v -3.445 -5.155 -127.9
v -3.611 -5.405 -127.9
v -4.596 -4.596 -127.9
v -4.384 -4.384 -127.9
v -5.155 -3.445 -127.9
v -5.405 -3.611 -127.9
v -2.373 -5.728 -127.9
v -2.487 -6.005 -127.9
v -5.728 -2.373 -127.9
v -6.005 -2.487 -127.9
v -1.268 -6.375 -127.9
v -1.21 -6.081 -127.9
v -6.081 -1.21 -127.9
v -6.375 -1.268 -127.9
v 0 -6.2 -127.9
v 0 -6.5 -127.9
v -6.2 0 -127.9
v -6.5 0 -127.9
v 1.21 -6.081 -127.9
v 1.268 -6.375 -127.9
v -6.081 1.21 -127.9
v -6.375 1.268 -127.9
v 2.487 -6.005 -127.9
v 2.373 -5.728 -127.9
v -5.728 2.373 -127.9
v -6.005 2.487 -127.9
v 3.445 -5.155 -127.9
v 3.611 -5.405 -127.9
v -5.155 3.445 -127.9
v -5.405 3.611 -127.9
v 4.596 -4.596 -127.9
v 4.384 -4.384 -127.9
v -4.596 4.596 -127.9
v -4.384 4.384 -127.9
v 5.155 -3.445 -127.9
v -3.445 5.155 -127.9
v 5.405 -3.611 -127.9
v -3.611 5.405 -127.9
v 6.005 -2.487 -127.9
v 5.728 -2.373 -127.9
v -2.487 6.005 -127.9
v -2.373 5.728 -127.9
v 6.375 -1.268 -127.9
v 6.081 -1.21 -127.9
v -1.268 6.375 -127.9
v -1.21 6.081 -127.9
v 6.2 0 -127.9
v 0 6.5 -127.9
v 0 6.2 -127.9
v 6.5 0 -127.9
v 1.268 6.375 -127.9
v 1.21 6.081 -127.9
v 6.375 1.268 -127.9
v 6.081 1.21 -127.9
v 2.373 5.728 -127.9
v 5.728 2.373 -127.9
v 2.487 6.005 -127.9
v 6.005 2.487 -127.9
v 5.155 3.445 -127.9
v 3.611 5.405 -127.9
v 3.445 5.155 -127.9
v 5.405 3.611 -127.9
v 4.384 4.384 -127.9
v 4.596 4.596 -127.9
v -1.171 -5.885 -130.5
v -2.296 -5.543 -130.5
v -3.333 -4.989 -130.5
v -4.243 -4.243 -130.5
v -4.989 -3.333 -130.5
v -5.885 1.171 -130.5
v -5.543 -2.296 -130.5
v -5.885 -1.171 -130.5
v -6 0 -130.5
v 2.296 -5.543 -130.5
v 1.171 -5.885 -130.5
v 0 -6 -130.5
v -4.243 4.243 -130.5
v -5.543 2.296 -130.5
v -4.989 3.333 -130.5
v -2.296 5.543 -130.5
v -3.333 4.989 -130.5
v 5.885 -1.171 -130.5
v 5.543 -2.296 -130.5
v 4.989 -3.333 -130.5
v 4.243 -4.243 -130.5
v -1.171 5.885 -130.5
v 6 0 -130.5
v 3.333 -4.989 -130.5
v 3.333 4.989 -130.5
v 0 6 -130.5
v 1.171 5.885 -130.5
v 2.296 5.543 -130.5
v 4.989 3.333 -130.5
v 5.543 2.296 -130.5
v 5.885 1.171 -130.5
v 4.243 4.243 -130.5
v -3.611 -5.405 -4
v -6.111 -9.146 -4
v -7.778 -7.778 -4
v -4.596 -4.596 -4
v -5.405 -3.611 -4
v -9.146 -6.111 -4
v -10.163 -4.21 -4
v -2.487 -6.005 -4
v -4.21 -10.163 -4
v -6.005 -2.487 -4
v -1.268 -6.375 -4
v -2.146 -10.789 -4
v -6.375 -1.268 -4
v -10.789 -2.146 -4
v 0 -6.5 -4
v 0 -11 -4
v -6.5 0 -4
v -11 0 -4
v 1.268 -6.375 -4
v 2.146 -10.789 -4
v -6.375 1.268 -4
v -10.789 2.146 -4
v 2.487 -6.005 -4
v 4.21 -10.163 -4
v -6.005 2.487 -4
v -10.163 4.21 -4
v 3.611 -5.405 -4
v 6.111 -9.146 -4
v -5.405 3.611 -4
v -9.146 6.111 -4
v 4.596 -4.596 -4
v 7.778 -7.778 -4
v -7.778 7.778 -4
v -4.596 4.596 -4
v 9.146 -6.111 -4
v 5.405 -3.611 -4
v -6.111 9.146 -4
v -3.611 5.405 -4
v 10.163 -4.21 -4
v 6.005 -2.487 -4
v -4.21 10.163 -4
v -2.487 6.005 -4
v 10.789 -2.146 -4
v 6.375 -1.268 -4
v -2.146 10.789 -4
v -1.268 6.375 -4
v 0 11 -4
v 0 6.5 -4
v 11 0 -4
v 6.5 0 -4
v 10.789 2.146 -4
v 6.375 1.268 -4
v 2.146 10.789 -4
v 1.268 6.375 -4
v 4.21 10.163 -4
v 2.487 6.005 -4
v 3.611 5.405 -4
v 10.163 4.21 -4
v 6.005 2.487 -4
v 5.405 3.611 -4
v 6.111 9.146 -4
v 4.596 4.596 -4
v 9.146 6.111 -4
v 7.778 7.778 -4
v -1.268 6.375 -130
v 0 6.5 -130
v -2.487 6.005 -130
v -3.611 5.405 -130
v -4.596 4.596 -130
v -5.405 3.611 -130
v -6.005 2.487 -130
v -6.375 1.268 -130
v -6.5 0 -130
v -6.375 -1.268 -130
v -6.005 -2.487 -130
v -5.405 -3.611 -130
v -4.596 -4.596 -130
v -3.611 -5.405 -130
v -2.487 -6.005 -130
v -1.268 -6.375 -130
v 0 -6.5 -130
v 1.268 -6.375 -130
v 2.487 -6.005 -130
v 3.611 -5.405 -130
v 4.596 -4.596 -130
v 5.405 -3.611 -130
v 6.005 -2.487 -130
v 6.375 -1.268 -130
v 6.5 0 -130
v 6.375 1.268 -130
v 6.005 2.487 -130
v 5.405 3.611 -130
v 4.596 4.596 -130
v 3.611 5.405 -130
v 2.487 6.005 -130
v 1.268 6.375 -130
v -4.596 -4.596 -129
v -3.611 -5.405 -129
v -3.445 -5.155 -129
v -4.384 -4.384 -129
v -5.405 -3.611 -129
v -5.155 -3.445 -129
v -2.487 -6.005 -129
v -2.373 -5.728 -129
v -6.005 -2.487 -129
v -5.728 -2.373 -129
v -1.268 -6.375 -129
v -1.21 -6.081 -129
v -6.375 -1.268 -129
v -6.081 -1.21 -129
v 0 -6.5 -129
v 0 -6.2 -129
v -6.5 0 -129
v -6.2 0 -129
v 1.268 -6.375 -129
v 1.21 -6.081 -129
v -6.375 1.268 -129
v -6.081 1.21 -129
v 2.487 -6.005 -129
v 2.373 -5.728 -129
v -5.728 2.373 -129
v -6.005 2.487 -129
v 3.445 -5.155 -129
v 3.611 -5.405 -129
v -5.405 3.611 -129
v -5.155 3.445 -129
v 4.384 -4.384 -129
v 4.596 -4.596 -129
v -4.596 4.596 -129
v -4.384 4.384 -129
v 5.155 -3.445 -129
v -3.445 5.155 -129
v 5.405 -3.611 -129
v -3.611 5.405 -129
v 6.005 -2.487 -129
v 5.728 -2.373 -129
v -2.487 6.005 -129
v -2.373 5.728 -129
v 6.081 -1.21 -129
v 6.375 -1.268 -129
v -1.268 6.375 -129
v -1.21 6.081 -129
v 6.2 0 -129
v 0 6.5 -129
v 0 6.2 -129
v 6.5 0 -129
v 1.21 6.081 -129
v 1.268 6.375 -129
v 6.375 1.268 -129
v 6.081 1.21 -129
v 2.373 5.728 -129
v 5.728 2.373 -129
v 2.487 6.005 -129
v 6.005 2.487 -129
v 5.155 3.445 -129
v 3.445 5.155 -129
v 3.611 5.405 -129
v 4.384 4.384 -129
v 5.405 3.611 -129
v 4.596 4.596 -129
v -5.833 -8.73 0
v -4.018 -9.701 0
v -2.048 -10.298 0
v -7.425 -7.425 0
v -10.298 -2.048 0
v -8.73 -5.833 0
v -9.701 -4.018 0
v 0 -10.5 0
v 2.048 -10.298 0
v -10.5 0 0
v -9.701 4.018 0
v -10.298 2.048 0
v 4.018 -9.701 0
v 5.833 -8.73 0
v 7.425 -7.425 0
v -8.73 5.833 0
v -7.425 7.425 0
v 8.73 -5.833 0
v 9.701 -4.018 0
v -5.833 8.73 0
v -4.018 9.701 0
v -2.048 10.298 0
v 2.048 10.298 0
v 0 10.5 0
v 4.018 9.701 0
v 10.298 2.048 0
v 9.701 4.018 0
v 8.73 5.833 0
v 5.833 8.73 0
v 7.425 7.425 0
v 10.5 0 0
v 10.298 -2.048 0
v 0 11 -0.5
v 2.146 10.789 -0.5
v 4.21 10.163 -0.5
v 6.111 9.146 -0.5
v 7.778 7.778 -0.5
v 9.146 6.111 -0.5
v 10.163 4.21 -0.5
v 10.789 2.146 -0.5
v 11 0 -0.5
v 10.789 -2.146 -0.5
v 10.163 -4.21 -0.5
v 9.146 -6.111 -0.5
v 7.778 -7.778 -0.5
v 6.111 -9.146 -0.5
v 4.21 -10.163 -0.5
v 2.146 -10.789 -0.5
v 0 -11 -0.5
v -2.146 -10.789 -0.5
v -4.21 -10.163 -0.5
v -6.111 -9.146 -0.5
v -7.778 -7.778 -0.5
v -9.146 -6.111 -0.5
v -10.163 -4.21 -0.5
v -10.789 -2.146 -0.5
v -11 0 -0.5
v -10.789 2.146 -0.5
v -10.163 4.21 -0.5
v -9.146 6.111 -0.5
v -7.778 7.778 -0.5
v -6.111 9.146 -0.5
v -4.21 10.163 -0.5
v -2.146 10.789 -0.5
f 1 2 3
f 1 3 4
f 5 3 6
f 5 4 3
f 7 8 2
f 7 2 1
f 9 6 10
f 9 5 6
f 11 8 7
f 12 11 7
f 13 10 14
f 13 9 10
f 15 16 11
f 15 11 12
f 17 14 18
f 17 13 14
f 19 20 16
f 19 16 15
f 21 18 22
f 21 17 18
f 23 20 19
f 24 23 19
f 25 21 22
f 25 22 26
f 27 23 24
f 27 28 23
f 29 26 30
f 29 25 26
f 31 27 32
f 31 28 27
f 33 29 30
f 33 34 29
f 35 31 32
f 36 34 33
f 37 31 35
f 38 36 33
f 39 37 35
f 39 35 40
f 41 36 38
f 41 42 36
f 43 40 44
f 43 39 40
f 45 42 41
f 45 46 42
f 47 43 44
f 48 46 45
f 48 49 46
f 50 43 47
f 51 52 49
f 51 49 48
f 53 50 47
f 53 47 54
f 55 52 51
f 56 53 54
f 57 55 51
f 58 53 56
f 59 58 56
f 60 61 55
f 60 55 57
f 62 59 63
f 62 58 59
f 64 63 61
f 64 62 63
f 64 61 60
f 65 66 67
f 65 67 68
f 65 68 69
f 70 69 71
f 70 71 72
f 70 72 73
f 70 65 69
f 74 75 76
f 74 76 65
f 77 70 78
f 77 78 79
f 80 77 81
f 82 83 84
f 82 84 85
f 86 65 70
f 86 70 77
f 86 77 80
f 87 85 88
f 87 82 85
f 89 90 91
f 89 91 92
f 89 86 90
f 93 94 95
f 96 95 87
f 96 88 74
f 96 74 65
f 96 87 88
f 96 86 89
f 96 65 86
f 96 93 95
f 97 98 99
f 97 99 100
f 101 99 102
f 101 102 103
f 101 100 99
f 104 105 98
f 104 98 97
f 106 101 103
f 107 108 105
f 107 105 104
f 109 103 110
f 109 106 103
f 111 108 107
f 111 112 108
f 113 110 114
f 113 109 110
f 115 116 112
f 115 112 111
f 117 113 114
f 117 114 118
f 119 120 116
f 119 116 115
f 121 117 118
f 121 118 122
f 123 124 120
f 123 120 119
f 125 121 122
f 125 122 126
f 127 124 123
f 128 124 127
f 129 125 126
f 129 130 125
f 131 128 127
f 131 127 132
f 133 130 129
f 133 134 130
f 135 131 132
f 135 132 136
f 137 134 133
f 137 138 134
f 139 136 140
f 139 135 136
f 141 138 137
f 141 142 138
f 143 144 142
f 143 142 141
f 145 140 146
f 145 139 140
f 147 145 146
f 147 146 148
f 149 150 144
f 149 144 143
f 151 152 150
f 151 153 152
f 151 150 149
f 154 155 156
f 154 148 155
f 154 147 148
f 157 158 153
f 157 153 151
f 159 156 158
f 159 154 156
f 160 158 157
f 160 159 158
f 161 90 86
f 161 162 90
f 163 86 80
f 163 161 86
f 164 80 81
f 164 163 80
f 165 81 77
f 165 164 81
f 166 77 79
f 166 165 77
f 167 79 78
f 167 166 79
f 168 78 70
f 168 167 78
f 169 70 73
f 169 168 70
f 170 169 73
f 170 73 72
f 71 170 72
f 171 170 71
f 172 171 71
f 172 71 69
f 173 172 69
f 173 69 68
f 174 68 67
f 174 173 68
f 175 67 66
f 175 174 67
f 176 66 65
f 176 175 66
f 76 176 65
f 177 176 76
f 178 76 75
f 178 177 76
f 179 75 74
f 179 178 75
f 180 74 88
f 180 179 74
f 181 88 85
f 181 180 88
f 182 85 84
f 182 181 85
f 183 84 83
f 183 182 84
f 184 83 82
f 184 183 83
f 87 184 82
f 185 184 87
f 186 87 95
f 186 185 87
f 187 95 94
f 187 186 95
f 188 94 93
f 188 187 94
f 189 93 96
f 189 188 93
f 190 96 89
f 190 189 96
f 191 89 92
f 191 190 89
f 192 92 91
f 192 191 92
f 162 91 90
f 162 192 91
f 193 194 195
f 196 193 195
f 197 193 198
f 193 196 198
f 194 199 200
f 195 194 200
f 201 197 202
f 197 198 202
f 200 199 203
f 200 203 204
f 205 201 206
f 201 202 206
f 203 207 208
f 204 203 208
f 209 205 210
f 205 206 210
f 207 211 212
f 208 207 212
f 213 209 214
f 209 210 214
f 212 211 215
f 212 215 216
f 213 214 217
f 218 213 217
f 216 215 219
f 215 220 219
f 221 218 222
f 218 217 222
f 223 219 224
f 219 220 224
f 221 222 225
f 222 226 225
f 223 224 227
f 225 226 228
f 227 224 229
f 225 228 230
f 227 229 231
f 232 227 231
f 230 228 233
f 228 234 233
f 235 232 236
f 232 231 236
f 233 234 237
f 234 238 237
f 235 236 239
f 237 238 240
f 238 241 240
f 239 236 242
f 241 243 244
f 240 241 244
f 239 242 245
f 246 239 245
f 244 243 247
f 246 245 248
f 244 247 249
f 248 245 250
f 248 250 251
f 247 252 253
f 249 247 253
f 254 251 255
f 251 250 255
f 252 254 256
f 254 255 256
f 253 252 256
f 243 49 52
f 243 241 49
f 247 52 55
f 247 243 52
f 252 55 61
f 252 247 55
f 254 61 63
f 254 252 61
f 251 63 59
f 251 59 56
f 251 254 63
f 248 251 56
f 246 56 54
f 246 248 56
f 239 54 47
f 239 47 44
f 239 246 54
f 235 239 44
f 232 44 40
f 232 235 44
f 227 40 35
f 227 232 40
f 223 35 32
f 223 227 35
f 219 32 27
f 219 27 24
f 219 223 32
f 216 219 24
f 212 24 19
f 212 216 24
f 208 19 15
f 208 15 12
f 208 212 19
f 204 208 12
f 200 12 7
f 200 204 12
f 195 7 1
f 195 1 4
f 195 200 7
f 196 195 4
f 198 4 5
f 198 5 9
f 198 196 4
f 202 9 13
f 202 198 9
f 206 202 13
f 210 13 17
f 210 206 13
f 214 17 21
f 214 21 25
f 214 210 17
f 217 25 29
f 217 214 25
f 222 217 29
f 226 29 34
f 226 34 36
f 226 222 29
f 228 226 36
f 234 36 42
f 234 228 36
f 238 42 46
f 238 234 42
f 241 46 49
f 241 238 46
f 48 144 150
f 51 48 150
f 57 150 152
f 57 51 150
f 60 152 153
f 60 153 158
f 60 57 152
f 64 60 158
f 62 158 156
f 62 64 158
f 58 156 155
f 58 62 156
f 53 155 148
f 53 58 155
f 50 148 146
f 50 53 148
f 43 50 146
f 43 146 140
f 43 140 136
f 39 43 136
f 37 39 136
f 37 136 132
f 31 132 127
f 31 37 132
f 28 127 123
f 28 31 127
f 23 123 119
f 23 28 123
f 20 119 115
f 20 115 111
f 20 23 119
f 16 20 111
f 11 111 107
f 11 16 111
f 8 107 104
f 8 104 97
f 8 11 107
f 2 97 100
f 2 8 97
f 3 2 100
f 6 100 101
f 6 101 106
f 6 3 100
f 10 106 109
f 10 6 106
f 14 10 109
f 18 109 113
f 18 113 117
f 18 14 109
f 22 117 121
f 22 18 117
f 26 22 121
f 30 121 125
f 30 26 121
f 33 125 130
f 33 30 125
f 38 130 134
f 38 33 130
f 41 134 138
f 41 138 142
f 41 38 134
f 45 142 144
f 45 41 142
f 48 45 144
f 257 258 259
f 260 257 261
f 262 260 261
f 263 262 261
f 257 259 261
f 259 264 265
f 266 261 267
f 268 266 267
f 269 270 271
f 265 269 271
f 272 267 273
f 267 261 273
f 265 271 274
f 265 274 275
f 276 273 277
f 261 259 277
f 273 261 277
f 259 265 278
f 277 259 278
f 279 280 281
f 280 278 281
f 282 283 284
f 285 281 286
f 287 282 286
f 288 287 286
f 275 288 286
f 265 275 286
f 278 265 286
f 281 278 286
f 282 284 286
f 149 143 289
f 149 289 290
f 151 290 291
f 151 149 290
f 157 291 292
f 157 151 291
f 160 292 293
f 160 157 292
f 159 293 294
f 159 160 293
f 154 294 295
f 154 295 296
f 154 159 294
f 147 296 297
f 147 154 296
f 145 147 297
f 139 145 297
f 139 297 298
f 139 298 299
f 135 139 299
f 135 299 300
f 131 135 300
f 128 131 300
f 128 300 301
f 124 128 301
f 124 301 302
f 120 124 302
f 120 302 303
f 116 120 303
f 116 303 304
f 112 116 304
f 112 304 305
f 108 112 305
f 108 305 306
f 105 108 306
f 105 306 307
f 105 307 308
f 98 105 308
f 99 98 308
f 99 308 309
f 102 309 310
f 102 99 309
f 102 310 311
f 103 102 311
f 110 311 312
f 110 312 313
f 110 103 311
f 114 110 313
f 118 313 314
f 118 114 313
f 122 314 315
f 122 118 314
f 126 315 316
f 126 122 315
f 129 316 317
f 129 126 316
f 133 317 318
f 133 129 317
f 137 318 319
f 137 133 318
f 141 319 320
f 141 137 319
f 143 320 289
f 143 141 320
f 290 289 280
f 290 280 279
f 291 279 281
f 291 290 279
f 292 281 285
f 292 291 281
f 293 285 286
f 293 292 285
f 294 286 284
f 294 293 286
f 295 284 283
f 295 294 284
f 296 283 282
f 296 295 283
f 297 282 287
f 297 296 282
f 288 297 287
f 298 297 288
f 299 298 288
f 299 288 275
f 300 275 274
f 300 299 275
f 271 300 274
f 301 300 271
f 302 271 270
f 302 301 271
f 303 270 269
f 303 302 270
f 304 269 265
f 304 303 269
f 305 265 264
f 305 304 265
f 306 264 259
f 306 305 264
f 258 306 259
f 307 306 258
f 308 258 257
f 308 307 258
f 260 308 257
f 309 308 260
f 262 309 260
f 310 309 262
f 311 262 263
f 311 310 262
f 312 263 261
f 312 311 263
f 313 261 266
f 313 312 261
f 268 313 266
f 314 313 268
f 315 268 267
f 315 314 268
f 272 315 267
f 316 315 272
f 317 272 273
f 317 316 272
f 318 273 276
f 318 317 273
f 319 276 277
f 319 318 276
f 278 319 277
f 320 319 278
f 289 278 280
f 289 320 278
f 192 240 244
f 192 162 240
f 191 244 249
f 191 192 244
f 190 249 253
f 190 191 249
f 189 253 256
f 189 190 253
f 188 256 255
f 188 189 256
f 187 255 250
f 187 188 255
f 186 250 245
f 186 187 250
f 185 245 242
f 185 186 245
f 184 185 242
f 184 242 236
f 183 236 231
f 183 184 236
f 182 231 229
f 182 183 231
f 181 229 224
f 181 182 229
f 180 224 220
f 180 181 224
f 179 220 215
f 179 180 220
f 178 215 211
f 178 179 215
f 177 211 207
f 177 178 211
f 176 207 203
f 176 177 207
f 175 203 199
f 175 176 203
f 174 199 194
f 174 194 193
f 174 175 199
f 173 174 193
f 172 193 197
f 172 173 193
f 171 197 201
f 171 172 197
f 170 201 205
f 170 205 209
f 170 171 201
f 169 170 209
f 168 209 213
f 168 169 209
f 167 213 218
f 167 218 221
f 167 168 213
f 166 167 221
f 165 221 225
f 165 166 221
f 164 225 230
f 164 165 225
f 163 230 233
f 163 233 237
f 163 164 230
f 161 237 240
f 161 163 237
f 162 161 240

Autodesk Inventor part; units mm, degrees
ref_plane "YZ Plane" through (0, 0, 0) normal (1, 0, 0) x (0, 1, 0)
ref_plane "XZ Plane" through (0, 0, 0) normal (0, 1, 0) x (-1, 0, 0)
ref_plane "XY Plane" through (0, 0, 0) normal (0, 0, 1) x (1, 0, 0)
sketch "Náčrt2" plane through (0, 0, 0) normal (1, 0, 0) x (0, 1, 0)
  line L0 (0, 0) -> (0, -130.5)
  line L1 (0, 0) -> (11, 0)
  line L2 (11, 0) -> (11, -4)
  line L3 (11, -4) -> (6.5, -4)
  line L4 (6.5, -4) -> (6.5, -127.9)
  line L5 (6.5, -127.9) -> (6.2, -127.9)
  line L6 (6.2, -127.9) -> (6.2, -129)
  line L7 (6.2, -129) -> (6.5, -129)
  line L8 (6.5, -129) -> (6.5, -130.5)
  line L9 (6.5, -130.5) -> (0, -130.5)
  dimension "d0" = 13
  dimension "d1" = 22
  dimension "d3" = 4
  dimension "d4" = 12.4
  dimension "d5" = 1.1
  dimension "d6" = 1.5
  dimension "d11" = 123.9
  dimension "d12" = 130.5
revolve "Rotace1" add sketch "Náčrt2" angle 360 about axis through (0, 0, 0) along (0, 0, -1)
chamfer "Zkosení1" distance 0.5 angle 45 2 edges at (0, -11, 0) (0, -6.5, -130.5)
properties part number "DD_KVD_003_10_B" material "Nerezová ocel"
